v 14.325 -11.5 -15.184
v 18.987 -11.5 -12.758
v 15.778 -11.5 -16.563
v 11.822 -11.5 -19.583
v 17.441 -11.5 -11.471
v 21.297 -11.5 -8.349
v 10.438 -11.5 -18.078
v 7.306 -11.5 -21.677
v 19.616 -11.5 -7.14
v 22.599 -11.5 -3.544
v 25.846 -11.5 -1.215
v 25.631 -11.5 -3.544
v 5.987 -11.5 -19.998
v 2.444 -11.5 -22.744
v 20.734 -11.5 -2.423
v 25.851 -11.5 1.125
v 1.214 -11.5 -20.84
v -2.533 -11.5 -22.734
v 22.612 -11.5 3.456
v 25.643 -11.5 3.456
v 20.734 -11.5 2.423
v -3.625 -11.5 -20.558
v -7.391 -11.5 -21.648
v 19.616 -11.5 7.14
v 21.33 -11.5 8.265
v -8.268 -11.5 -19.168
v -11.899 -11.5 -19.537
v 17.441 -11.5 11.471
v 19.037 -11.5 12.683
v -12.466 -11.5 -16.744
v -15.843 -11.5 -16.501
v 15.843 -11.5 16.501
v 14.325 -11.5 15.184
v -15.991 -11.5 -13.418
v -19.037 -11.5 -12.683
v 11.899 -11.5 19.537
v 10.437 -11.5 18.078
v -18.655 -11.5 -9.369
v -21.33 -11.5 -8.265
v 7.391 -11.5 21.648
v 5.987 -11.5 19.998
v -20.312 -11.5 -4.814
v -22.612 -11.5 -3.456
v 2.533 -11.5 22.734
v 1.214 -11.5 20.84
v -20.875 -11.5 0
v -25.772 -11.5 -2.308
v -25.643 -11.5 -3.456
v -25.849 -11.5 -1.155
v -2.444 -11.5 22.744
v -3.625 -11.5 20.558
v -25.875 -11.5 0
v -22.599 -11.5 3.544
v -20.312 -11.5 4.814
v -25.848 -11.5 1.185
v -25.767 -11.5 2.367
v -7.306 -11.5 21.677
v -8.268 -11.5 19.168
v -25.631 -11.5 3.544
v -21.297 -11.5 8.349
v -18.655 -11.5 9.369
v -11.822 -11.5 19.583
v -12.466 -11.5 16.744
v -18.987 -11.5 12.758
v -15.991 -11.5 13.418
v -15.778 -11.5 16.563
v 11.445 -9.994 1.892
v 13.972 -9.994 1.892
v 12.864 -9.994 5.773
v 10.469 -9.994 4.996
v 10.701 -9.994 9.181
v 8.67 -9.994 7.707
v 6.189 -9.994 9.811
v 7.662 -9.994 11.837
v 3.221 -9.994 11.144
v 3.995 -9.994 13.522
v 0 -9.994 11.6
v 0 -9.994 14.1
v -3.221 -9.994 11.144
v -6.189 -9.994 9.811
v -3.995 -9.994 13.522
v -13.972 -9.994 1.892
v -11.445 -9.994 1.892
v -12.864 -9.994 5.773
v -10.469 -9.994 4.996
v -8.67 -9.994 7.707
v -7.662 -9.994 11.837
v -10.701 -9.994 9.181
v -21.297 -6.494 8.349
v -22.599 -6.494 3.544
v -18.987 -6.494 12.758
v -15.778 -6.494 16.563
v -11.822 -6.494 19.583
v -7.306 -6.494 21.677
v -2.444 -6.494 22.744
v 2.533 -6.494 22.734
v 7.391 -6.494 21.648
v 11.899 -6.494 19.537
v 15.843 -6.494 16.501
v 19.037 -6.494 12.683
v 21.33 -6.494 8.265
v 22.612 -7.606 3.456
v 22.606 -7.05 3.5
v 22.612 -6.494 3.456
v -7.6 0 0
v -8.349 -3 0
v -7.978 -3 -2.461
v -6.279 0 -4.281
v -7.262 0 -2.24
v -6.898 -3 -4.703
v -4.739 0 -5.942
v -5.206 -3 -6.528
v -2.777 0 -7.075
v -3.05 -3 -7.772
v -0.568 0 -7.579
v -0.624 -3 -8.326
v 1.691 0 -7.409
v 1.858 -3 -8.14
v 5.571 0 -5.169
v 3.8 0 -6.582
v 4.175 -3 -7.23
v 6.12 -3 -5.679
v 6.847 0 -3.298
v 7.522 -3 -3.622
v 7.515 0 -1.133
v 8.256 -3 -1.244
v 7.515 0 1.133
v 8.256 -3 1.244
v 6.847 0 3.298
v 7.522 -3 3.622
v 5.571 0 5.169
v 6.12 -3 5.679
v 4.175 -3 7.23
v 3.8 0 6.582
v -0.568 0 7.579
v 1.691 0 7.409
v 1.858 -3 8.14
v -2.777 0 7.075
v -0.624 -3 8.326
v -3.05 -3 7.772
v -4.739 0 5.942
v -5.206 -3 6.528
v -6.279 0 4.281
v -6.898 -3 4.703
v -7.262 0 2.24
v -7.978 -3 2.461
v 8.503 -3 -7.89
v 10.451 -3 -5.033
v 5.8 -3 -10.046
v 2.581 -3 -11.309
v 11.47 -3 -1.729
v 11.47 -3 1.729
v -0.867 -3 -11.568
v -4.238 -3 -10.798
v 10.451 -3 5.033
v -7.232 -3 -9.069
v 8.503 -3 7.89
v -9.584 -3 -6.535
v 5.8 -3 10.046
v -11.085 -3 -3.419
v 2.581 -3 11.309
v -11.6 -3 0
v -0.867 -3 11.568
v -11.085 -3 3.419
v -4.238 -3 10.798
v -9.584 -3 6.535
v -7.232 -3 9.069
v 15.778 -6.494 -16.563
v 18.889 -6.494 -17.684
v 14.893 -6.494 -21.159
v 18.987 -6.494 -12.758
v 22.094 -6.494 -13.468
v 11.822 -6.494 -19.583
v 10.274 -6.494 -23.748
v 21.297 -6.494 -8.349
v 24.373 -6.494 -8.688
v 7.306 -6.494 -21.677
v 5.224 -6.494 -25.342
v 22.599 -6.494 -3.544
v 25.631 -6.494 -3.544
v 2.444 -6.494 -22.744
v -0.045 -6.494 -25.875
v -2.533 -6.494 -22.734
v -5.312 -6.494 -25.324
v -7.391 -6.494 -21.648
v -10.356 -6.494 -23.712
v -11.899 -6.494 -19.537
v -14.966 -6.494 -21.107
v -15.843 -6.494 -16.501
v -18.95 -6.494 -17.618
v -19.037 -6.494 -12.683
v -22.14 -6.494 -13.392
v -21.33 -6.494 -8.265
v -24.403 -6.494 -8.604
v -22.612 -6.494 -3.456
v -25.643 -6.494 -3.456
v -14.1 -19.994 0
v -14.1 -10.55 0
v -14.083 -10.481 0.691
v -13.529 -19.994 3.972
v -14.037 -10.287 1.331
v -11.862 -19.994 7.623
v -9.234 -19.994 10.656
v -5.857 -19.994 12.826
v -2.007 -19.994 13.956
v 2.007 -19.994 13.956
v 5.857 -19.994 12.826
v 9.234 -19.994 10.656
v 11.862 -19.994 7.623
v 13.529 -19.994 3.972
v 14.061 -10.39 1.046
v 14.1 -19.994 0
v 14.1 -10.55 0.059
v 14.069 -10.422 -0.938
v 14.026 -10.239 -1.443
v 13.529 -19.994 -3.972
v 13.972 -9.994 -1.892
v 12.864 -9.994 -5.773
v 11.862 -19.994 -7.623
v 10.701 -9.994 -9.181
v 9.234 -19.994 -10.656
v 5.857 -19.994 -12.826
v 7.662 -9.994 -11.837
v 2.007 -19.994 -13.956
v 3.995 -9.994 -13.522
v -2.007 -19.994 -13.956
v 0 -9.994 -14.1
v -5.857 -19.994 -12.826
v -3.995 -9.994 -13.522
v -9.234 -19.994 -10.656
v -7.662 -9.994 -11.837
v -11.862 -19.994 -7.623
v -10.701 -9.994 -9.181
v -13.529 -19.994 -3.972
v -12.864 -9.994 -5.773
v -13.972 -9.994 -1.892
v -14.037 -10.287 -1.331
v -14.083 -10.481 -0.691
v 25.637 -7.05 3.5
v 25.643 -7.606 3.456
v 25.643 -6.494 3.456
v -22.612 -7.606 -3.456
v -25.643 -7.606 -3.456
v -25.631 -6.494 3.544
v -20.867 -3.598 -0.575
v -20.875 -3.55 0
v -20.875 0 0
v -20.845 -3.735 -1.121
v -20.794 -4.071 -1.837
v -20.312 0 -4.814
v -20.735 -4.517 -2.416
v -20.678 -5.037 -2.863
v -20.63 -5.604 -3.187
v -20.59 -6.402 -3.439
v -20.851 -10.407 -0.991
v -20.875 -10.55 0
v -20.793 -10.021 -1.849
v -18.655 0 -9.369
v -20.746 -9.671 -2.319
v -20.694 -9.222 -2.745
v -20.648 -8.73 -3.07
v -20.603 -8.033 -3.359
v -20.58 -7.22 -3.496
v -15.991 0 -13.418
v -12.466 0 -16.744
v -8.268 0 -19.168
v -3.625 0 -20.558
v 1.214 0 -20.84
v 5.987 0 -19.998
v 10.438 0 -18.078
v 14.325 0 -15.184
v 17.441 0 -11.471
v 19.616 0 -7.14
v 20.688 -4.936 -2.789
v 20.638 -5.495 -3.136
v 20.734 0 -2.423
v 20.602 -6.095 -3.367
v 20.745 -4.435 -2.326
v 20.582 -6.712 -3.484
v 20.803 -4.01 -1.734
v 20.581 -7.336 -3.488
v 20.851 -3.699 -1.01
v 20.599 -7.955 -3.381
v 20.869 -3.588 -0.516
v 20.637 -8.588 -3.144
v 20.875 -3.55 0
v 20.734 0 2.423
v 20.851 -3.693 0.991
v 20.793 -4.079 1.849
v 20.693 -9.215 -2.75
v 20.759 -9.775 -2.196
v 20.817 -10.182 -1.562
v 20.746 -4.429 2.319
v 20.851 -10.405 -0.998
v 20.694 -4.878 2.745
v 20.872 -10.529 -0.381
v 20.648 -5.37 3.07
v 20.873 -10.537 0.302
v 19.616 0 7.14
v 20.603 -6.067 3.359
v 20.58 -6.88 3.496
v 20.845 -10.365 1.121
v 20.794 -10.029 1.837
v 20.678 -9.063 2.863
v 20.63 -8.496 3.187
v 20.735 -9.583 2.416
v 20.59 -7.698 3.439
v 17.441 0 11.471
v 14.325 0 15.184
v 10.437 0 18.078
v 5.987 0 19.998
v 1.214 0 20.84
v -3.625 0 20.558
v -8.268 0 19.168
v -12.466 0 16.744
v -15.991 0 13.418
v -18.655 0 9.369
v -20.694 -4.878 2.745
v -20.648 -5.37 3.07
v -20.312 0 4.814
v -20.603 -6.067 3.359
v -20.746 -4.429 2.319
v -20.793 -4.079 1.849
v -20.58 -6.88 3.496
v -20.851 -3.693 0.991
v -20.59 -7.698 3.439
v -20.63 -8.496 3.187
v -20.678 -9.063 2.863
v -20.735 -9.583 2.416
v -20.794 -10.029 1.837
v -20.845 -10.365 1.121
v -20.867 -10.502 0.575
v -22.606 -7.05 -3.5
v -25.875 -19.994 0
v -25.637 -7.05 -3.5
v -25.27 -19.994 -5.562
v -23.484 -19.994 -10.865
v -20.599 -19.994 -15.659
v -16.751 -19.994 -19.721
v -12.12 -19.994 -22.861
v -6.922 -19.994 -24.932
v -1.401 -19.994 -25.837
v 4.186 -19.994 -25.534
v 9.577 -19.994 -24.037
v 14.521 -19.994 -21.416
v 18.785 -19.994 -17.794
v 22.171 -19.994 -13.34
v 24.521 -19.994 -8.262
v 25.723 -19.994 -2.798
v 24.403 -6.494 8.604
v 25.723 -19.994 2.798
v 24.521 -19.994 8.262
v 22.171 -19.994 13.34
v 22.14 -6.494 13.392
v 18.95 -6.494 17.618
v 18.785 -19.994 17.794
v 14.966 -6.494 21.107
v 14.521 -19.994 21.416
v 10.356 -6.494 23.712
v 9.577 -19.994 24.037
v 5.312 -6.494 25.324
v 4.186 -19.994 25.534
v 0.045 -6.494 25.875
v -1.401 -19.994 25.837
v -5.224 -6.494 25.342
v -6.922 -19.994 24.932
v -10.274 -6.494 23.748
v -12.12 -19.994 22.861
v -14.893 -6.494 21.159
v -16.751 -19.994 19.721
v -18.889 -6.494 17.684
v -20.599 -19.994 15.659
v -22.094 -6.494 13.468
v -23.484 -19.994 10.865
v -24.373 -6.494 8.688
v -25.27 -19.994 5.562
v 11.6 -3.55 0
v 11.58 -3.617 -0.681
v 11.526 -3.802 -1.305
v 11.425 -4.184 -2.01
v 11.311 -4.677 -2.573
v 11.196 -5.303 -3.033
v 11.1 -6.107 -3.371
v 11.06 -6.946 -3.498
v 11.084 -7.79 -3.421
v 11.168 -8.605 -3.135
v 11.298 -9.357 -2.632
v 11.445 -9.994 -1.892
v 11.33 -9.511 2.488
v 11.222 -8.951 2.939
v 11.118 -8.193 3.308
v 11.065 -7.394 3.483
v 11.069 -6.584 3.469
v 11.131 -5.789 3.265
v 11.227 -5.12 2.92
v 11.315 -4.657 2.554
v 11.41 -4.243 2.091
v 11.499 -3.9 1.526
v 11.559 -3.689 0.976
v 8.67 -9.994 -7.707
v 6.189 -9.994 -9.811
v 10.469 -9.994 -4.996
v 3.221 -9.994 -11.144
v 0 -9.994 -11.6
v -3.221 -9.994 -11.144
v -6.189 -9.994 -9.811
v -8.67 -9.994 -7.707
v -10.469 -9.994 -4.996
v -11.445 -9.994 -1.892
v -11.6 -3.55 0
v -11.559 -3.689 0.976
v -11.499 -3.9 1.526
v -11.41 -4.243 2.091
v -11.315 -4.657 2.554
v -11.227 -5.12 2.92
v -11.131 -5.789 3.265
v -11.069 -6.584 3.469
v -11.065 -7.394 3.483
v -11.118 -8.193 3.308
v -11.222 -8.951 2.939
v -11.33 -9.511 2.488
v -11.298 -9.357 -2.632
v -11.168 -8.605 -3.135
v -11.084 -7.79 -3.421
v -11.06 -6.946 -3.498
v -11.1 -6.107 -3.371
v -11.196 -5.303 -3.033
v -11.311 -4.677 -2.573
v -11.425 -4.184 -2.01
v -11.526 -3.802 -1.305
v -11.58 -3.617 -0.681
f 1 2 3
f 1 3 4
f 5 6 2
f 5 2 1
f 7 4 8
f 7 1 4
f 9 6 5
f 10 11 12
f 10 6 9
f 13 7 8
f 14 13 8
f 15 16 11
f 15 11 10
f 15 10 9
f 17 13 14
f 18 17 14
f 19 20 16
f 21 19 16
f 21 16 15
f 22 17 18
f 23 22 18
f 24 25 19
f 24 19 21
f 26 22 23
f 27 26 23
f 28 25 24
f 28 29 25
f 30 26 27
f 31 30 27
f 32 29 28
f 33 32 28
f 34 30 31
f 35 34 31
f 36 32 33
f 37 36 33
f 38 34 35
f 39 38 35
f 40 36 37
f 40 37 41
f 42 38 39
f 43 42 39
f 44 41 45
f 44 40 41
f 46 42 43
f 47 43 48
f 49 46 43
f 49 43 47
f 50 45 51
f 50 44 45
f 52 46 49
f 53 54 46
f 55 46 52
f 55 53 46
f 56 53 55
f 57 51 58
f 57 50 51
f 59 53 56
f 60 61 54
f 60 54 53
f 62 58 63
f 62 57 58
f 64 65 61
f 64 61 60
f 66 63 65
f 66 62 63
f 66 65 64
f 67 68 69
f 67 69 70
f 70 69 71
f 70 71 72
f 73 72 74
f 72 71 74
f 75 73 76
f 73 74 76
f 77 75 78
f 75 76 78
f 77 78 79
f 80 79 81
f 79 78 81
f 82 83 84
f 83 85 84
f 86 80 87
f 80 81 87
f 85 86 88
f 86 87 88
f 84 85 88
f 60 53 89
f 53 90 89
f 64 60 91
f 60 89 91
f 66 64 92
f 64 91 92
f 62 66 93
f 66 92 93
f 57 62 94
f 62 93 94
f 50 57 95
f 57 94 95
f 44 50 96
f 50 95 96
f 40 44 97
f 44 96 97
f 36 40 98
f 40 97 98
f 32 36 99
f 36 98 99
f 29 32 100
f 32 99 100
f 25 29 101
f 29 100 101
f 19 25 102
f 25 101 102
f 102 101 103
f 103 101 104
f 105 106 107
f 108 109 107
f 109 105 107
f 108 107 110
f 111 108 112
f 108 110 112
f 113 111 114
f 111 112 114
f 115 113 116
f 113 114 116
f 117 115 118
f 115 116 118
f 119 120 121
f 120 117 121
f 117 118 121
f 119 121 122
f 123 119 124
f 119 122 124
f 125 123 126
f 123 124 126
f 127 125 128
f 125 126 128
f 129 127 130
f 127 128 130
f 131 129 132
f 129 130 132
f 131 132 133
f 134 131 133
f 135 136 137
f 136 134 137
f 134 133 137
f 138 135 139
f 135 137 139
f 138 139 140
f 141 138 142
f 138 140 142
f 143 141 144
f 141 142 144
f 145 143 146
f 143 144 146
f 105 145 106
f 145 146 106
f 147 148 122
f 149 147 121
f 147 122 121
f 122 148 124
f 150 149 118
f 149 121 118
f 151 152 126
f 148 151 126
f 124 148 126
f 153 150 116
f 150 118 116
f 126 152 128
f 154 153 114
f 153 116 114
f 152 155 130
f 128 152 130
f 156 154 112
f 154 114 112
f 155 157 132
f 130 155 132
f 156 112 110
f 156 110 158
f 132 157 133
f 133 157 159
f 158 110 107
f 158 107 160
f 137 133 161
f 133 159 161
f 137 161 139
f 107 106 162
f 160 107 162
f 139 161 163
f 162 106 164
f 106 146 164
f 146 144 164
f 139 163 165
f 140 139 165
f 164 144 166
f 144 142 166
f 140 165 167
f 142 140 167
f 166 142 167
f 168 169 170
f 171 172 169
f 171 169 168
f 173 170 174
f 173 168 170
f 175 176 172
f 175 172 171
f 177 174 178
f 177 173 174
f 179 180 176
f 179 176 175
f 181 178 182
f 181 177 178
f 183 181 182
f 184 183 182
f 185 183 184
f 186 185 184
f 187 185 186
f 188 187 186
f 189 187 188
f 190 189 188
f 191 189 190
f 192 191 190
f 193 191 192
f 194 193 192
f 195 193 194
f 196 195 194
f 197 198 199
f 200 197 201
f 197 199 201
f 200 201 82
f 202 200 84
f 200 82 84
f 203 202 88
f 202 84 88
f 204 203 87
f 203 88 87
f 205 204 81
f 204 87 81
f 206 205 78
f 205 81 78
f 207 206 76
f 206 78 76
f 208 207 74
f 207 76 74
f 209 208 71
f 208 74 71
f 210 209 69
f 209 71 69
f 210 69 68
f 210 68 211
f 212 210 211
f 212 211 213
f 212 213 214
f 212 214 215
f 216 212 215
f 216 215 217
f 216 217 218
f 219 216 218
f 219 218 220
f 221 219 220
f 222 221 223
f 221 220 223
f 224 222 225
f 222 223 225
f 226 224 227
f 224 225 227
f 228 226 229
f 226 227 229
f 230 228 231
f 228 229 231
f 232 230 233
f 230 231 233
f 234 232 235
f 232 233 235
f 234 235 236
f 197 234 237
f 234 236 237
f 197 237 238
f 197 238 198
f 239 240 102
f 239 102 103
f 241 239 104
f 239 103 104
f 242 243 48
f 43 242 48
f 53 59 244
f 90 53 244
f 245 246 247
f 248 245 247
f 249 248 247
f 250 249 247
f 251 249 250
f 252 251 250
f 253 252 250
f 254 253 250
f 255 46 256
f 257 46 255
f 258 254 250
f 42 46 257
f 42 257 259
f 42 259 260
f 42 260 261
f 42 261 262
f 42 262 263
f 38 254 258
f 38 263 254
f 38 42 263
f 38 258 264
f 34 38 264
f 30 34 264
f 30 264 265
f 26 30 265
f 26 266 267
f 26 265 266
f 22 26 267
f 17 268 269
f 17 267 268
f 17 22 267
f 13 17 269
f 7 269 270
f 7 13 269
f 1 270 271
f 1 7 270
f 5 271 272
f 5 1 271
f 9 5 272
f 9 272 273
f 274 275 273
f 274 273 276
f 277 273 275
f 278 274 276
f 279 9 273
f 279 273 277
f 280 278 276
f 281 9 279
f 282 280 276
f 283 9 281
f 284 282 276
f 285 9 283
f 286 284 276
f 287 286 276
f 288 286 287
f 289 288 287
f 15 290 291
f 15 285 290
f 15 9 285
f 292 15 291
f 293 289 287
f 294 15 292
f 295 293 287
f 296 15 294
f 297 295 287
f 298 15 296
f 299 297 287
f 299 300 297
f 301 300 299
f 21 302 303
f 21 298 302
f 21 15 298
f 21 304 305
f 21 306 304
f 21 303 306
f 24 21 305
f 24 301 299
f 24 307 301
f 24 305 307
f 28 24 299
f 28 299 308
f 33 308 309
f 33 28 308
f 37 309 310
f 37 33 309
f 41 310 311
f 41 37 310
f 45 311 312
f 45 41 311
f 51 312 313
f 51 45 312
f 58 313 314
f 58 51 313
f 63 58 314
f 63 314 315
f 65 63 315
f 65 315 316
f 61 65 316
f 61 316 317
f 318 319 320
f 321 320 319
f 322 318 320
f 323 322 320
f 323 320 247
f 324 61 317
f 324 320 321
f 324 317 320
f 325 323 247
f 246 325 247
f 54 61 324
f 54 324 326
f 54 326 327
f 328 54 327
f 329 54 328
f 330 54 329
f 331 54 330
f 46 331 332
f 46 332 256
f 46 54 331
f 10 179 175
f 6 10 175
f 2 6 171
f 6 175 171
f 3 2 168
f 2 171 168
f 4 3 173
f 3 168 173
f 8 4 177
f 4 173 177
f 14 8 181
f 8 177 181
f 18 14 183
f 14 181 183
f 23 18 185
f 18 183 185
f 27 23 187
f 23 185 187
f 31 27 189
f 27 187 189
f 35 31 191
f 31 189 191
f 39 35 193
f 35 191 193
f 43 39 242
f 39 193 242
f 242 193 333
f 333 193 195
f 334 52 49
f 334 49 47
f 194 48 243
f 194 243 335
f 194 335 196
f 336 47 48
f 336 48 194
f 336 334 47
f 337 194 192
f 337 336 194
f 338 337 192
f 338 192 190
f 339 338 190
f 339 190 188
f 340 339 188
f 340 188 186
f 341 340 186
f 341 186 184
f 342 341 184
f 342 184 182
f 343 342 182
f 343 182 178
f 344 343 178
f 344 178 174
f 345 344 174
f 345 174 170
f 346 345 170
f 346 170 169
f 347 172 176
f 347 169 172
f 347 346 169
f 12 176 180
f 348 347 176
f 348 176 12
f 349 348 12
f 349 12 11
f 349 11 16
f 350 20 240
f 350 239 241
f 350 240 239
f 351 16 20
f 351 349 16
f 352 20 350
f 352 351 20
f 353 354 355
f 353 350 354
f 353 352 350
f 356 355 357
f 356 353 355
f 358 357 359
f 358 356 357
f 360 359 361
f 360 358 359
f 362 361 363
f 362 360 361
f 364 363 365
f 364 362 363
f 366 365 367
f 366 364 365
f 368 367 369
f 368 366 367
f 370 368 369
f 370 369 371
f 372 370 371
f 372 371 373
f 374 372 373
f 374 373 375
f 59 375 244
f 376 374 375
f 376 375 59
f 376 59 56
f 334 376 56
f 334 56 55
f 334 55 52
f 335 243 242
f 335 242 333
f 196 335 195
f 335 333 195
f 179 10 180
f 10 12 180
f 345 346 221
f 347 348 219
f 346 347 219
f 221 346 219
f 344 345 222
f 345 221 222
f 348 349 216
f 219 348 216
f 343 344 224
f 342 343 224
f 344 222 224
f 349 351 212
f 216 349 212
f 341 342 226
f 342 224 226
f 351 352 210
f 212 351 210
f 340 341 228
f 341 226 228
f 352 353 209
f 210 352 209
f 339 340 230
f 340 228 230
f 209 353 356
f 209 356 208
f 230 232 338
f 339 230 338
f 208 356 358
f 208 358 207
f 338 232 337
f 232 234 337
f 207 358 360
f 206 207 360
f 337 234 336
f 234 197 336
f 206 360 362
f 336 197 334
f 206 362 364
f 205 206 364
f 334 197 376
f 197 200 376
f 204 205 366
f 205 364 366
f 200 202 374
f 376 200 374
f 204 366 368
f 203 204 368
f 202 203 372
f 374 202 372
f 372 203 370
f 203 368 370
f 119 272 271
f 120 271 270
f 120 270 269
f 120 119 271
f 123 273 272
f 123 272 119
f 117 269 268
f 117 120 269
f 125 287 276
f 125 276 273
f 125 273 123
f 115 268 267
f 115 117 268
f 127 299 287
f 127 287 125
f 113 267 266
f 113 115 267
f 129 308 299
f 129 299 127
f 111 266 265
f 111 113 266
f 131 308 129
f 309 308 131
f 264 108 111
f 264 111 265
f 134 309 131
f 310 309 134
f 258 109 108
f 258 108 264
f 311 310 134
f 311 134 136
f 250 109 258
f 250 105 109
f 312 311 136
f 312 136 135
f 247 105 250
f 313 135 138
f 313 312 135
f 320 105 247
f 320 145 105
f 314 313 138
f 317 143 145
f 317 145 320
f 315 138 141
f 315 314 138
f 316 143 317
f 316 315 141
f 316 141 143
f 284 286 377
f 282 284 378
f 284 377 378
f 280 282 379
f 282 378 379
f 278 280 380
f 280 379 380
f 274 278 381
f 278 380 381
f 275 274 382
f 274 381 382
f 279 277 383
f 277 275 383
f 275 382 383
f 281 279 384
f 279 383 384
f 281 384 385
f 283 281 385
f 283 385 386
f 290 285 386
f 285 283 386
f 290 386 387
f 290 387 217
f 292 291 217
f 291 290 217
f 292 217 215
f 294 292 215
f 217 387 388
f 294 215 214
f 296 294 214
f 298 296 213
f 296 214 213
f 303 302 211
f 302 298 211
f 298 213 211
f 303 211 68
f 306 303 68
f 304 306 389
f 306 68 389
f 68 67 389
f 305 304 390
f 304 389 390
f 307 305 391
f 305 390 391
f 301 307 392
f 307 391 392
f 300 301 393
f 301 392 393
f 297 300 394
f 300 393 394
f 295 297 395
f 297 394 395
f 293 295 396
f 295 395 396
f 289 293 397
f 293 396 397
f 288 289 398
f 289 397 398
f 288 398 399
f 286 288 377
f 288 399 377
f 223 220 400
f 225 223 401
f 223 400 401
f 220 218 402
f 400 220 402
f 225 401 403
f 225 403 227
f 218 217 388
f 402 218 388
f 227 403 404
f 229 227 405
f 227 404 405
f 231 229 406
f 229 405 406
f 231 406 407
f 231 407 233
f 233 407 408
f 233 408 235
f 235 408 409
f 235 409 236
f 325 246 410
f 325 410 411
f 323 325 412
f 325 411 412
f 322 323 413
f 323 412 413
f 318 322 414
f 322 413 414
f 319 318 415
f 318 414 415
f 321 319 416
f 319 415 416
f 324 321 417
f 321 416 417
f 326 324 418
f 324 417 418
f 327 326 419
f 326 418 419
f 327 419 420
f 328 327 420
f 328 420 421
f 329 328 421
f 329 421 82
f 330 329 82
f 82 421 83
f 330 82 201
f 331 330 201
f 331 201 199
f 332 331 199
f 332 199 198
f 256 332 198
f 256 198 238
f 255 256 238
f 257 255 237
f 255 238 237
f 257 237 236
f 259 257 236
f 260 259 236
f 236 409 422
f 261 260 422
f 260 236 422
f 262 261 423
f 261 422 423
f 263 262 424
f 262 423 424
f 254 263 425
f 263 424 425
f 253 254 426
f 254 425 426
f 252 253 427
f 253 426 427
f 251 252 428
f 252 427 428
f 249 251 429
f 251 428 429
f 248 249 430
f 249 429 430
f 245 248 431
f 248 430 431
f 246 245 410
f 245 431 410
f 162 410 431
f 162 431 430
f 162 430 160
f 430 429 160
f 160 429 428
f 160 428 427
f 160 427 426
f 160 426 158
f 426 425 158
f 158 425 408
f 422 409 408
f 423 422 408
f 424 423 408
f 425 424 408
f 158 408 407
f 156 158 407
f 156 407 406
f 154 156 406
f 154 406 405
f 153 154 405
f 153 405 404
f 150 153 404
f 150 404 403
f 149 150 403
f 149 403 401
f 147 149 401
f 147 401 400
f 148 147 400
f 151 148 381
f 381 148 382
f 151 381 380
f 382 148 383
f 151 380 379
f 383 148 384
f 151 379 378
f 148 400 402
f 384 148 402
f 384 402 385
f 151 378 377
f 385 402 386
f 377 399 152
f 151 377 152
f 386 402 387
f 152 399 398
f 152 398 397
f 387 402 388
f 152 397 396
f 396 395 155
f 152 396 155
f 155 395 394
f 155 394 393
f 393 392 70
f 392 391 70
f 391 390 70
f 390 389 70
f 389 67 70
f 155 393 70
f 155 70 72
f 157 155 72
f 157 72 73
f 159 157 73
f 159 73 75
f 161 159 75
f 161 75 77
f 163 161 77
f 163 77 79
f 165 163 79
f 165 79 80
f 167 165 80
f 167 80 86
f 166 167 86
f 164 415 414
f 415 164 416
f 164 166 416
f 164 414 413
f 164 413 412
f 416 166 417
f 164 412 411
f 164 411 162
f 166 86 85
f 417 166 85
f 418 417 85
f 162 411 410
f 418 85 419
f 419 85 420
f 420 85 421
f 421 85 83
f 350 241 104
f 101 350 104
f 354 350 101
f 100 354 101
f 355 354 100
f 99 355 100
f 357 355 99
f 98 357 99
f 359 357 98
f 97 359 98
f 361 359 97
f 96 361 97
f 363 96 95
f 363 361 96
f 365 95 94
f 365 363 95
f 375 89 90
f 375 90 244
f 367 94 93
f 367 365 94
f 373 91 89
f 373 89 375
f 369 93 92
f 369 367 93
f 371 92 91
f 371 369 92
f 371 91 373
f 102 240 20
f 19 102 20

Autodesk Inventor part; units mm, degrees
ref_plane "XZ Plane" through (0, 0, 0) normal (0, 1, 0) x (-1, 0, 0)
sketch "Sketch2" plane through (0, 0, 0) normal (0, 0, 1) x (1, 0, 0)
  line L0 (0, 0) -> (-20.875, 0)
  line L1 (-20.875, 0) -> (-20.875, -11.5)
  line L2 (-20.875, -11.5) -> (-22.875, -11.5)
  line L3 (-22.875, -11.5) -> (-22.875, -6.4943)
  line L4 (-22.875, -6.4943) -> (-25.875, -6.4943)
  line L5 (-25.875, -6.4943) -> (-25.875, -12.9943)
  line L6 (0, -3) -> (0, 0)
  line L7 (-25.875, -12.9943) -> (-25.875, -19.9943)
  line L8 (-25.875, -19.9943) -> (-14.1, -19.9943)
  line L9 (-14.1, 0) -> (-14.1, -19.9943) construction
  line L10 (-7.6, 0) -> (-7.6, -3) construction
  line L11 (-7.6, -3) -> (0, -3) construction
  line L12 (-7.6, 0) -> (-7.6, -10) construction
  line L13 (-8.349, -3) -> (-14.1, -3)
  line L14 (-14.1, -19.9943) -> (-14.1, -3)
  line L15 (-11.6, -3) -> (-11.6, -9.9943)
  line L16 (-11.6, -9.9943) -> (-14.1, -9.9943)
  line L17 (-7.6, 0) -> (-8.349, -3)
  dimension "d3" = 20.875
  dimension "d4" = 11.5
  dimension "d5" = 2
  dimension "d6" = 3
  dimension "d7" = 6.5
  dimension "d9" = 7
  dimension "d10" = 14.1
  dimension "d11" = 3
  dimension "d12" = 7.6
  dimension "d13" = 10
  dimension "d31" = 2.5
  dimension "d33" = 10
revolve "Revolution1" add sketch "Sketch2" angle 360 about axis through (0, -3, 0) along (0, 1, 0)
sketch "Sketch3" plane through (0, 0, 0) normal (1, 0, 0) x (0, 1, 0)
  line L0 (0, -7.6) -> (0, 7.6) projected
  circle A0 centre (-7.05, 0) radius 3.5
  point P0 (0, 0)
  dimension "d16" = 7.05
  dimension "d17" = 0
  dimension "d20" = 7
extrude "Extrusion1" cut sketch "Sketch3" along normal through all both and the other way through all
ref_plane "Work Plane1" through (-28, 0, 0) normal (1, 0, 0) x (0, 1, 0)
sketch "Sketch4" plane through (-28, 0, 0) normal (1, 0, 0) x (0, 1, 0)
  line L0 (-11.5, -20.875) -> (-11.5, 20.875) projected
  line L1 (-6.4943, -3.4556) -> (-11.5, -3.4556)
  line L2 (-11.5, -3.4556) -> (-11.5, 3.5444)
  line L3 (-11.5, 3.5444) -> (-6.4943, 3.5444)
  line L4 (-6.4943, 3.5444) -> (-6.4943, -3.4556)
  point P0 (0, 0)
  dimension "d24" = 7
extrude "Extrusion2" cut sketch "Sketch4" along normal up to surface
ref_plane "Work Plane2" through (28, 0, 0) normal (1, 0, 0) x (0, 1, 0)
sketch "Sketch5" plane through (28, 0, 0) normal (1, 0, 0) x (0, 1, 0)
  line L0 (-11.5, -20.875) -> (-11.5, 20.875) projected
  line L1 (-6.4943, 3.4556) -> (-11.5, 3.4556)
  line L2 (-11.5, 3.4556) -> (-11.5, -3.5444)
  line L3 (-11.5, -3.5444) -> (-6.4943, -3.5444)
  line L4 (-6.4943, -3.5444) -> (-6.4943, 3.4556)
  point P0 (0, 0)
  dimension "d28" = 7
extrude "Extrusion3" cut sketch "Sketch5" against normal up to surface
properties part number "bottom seal v2"
